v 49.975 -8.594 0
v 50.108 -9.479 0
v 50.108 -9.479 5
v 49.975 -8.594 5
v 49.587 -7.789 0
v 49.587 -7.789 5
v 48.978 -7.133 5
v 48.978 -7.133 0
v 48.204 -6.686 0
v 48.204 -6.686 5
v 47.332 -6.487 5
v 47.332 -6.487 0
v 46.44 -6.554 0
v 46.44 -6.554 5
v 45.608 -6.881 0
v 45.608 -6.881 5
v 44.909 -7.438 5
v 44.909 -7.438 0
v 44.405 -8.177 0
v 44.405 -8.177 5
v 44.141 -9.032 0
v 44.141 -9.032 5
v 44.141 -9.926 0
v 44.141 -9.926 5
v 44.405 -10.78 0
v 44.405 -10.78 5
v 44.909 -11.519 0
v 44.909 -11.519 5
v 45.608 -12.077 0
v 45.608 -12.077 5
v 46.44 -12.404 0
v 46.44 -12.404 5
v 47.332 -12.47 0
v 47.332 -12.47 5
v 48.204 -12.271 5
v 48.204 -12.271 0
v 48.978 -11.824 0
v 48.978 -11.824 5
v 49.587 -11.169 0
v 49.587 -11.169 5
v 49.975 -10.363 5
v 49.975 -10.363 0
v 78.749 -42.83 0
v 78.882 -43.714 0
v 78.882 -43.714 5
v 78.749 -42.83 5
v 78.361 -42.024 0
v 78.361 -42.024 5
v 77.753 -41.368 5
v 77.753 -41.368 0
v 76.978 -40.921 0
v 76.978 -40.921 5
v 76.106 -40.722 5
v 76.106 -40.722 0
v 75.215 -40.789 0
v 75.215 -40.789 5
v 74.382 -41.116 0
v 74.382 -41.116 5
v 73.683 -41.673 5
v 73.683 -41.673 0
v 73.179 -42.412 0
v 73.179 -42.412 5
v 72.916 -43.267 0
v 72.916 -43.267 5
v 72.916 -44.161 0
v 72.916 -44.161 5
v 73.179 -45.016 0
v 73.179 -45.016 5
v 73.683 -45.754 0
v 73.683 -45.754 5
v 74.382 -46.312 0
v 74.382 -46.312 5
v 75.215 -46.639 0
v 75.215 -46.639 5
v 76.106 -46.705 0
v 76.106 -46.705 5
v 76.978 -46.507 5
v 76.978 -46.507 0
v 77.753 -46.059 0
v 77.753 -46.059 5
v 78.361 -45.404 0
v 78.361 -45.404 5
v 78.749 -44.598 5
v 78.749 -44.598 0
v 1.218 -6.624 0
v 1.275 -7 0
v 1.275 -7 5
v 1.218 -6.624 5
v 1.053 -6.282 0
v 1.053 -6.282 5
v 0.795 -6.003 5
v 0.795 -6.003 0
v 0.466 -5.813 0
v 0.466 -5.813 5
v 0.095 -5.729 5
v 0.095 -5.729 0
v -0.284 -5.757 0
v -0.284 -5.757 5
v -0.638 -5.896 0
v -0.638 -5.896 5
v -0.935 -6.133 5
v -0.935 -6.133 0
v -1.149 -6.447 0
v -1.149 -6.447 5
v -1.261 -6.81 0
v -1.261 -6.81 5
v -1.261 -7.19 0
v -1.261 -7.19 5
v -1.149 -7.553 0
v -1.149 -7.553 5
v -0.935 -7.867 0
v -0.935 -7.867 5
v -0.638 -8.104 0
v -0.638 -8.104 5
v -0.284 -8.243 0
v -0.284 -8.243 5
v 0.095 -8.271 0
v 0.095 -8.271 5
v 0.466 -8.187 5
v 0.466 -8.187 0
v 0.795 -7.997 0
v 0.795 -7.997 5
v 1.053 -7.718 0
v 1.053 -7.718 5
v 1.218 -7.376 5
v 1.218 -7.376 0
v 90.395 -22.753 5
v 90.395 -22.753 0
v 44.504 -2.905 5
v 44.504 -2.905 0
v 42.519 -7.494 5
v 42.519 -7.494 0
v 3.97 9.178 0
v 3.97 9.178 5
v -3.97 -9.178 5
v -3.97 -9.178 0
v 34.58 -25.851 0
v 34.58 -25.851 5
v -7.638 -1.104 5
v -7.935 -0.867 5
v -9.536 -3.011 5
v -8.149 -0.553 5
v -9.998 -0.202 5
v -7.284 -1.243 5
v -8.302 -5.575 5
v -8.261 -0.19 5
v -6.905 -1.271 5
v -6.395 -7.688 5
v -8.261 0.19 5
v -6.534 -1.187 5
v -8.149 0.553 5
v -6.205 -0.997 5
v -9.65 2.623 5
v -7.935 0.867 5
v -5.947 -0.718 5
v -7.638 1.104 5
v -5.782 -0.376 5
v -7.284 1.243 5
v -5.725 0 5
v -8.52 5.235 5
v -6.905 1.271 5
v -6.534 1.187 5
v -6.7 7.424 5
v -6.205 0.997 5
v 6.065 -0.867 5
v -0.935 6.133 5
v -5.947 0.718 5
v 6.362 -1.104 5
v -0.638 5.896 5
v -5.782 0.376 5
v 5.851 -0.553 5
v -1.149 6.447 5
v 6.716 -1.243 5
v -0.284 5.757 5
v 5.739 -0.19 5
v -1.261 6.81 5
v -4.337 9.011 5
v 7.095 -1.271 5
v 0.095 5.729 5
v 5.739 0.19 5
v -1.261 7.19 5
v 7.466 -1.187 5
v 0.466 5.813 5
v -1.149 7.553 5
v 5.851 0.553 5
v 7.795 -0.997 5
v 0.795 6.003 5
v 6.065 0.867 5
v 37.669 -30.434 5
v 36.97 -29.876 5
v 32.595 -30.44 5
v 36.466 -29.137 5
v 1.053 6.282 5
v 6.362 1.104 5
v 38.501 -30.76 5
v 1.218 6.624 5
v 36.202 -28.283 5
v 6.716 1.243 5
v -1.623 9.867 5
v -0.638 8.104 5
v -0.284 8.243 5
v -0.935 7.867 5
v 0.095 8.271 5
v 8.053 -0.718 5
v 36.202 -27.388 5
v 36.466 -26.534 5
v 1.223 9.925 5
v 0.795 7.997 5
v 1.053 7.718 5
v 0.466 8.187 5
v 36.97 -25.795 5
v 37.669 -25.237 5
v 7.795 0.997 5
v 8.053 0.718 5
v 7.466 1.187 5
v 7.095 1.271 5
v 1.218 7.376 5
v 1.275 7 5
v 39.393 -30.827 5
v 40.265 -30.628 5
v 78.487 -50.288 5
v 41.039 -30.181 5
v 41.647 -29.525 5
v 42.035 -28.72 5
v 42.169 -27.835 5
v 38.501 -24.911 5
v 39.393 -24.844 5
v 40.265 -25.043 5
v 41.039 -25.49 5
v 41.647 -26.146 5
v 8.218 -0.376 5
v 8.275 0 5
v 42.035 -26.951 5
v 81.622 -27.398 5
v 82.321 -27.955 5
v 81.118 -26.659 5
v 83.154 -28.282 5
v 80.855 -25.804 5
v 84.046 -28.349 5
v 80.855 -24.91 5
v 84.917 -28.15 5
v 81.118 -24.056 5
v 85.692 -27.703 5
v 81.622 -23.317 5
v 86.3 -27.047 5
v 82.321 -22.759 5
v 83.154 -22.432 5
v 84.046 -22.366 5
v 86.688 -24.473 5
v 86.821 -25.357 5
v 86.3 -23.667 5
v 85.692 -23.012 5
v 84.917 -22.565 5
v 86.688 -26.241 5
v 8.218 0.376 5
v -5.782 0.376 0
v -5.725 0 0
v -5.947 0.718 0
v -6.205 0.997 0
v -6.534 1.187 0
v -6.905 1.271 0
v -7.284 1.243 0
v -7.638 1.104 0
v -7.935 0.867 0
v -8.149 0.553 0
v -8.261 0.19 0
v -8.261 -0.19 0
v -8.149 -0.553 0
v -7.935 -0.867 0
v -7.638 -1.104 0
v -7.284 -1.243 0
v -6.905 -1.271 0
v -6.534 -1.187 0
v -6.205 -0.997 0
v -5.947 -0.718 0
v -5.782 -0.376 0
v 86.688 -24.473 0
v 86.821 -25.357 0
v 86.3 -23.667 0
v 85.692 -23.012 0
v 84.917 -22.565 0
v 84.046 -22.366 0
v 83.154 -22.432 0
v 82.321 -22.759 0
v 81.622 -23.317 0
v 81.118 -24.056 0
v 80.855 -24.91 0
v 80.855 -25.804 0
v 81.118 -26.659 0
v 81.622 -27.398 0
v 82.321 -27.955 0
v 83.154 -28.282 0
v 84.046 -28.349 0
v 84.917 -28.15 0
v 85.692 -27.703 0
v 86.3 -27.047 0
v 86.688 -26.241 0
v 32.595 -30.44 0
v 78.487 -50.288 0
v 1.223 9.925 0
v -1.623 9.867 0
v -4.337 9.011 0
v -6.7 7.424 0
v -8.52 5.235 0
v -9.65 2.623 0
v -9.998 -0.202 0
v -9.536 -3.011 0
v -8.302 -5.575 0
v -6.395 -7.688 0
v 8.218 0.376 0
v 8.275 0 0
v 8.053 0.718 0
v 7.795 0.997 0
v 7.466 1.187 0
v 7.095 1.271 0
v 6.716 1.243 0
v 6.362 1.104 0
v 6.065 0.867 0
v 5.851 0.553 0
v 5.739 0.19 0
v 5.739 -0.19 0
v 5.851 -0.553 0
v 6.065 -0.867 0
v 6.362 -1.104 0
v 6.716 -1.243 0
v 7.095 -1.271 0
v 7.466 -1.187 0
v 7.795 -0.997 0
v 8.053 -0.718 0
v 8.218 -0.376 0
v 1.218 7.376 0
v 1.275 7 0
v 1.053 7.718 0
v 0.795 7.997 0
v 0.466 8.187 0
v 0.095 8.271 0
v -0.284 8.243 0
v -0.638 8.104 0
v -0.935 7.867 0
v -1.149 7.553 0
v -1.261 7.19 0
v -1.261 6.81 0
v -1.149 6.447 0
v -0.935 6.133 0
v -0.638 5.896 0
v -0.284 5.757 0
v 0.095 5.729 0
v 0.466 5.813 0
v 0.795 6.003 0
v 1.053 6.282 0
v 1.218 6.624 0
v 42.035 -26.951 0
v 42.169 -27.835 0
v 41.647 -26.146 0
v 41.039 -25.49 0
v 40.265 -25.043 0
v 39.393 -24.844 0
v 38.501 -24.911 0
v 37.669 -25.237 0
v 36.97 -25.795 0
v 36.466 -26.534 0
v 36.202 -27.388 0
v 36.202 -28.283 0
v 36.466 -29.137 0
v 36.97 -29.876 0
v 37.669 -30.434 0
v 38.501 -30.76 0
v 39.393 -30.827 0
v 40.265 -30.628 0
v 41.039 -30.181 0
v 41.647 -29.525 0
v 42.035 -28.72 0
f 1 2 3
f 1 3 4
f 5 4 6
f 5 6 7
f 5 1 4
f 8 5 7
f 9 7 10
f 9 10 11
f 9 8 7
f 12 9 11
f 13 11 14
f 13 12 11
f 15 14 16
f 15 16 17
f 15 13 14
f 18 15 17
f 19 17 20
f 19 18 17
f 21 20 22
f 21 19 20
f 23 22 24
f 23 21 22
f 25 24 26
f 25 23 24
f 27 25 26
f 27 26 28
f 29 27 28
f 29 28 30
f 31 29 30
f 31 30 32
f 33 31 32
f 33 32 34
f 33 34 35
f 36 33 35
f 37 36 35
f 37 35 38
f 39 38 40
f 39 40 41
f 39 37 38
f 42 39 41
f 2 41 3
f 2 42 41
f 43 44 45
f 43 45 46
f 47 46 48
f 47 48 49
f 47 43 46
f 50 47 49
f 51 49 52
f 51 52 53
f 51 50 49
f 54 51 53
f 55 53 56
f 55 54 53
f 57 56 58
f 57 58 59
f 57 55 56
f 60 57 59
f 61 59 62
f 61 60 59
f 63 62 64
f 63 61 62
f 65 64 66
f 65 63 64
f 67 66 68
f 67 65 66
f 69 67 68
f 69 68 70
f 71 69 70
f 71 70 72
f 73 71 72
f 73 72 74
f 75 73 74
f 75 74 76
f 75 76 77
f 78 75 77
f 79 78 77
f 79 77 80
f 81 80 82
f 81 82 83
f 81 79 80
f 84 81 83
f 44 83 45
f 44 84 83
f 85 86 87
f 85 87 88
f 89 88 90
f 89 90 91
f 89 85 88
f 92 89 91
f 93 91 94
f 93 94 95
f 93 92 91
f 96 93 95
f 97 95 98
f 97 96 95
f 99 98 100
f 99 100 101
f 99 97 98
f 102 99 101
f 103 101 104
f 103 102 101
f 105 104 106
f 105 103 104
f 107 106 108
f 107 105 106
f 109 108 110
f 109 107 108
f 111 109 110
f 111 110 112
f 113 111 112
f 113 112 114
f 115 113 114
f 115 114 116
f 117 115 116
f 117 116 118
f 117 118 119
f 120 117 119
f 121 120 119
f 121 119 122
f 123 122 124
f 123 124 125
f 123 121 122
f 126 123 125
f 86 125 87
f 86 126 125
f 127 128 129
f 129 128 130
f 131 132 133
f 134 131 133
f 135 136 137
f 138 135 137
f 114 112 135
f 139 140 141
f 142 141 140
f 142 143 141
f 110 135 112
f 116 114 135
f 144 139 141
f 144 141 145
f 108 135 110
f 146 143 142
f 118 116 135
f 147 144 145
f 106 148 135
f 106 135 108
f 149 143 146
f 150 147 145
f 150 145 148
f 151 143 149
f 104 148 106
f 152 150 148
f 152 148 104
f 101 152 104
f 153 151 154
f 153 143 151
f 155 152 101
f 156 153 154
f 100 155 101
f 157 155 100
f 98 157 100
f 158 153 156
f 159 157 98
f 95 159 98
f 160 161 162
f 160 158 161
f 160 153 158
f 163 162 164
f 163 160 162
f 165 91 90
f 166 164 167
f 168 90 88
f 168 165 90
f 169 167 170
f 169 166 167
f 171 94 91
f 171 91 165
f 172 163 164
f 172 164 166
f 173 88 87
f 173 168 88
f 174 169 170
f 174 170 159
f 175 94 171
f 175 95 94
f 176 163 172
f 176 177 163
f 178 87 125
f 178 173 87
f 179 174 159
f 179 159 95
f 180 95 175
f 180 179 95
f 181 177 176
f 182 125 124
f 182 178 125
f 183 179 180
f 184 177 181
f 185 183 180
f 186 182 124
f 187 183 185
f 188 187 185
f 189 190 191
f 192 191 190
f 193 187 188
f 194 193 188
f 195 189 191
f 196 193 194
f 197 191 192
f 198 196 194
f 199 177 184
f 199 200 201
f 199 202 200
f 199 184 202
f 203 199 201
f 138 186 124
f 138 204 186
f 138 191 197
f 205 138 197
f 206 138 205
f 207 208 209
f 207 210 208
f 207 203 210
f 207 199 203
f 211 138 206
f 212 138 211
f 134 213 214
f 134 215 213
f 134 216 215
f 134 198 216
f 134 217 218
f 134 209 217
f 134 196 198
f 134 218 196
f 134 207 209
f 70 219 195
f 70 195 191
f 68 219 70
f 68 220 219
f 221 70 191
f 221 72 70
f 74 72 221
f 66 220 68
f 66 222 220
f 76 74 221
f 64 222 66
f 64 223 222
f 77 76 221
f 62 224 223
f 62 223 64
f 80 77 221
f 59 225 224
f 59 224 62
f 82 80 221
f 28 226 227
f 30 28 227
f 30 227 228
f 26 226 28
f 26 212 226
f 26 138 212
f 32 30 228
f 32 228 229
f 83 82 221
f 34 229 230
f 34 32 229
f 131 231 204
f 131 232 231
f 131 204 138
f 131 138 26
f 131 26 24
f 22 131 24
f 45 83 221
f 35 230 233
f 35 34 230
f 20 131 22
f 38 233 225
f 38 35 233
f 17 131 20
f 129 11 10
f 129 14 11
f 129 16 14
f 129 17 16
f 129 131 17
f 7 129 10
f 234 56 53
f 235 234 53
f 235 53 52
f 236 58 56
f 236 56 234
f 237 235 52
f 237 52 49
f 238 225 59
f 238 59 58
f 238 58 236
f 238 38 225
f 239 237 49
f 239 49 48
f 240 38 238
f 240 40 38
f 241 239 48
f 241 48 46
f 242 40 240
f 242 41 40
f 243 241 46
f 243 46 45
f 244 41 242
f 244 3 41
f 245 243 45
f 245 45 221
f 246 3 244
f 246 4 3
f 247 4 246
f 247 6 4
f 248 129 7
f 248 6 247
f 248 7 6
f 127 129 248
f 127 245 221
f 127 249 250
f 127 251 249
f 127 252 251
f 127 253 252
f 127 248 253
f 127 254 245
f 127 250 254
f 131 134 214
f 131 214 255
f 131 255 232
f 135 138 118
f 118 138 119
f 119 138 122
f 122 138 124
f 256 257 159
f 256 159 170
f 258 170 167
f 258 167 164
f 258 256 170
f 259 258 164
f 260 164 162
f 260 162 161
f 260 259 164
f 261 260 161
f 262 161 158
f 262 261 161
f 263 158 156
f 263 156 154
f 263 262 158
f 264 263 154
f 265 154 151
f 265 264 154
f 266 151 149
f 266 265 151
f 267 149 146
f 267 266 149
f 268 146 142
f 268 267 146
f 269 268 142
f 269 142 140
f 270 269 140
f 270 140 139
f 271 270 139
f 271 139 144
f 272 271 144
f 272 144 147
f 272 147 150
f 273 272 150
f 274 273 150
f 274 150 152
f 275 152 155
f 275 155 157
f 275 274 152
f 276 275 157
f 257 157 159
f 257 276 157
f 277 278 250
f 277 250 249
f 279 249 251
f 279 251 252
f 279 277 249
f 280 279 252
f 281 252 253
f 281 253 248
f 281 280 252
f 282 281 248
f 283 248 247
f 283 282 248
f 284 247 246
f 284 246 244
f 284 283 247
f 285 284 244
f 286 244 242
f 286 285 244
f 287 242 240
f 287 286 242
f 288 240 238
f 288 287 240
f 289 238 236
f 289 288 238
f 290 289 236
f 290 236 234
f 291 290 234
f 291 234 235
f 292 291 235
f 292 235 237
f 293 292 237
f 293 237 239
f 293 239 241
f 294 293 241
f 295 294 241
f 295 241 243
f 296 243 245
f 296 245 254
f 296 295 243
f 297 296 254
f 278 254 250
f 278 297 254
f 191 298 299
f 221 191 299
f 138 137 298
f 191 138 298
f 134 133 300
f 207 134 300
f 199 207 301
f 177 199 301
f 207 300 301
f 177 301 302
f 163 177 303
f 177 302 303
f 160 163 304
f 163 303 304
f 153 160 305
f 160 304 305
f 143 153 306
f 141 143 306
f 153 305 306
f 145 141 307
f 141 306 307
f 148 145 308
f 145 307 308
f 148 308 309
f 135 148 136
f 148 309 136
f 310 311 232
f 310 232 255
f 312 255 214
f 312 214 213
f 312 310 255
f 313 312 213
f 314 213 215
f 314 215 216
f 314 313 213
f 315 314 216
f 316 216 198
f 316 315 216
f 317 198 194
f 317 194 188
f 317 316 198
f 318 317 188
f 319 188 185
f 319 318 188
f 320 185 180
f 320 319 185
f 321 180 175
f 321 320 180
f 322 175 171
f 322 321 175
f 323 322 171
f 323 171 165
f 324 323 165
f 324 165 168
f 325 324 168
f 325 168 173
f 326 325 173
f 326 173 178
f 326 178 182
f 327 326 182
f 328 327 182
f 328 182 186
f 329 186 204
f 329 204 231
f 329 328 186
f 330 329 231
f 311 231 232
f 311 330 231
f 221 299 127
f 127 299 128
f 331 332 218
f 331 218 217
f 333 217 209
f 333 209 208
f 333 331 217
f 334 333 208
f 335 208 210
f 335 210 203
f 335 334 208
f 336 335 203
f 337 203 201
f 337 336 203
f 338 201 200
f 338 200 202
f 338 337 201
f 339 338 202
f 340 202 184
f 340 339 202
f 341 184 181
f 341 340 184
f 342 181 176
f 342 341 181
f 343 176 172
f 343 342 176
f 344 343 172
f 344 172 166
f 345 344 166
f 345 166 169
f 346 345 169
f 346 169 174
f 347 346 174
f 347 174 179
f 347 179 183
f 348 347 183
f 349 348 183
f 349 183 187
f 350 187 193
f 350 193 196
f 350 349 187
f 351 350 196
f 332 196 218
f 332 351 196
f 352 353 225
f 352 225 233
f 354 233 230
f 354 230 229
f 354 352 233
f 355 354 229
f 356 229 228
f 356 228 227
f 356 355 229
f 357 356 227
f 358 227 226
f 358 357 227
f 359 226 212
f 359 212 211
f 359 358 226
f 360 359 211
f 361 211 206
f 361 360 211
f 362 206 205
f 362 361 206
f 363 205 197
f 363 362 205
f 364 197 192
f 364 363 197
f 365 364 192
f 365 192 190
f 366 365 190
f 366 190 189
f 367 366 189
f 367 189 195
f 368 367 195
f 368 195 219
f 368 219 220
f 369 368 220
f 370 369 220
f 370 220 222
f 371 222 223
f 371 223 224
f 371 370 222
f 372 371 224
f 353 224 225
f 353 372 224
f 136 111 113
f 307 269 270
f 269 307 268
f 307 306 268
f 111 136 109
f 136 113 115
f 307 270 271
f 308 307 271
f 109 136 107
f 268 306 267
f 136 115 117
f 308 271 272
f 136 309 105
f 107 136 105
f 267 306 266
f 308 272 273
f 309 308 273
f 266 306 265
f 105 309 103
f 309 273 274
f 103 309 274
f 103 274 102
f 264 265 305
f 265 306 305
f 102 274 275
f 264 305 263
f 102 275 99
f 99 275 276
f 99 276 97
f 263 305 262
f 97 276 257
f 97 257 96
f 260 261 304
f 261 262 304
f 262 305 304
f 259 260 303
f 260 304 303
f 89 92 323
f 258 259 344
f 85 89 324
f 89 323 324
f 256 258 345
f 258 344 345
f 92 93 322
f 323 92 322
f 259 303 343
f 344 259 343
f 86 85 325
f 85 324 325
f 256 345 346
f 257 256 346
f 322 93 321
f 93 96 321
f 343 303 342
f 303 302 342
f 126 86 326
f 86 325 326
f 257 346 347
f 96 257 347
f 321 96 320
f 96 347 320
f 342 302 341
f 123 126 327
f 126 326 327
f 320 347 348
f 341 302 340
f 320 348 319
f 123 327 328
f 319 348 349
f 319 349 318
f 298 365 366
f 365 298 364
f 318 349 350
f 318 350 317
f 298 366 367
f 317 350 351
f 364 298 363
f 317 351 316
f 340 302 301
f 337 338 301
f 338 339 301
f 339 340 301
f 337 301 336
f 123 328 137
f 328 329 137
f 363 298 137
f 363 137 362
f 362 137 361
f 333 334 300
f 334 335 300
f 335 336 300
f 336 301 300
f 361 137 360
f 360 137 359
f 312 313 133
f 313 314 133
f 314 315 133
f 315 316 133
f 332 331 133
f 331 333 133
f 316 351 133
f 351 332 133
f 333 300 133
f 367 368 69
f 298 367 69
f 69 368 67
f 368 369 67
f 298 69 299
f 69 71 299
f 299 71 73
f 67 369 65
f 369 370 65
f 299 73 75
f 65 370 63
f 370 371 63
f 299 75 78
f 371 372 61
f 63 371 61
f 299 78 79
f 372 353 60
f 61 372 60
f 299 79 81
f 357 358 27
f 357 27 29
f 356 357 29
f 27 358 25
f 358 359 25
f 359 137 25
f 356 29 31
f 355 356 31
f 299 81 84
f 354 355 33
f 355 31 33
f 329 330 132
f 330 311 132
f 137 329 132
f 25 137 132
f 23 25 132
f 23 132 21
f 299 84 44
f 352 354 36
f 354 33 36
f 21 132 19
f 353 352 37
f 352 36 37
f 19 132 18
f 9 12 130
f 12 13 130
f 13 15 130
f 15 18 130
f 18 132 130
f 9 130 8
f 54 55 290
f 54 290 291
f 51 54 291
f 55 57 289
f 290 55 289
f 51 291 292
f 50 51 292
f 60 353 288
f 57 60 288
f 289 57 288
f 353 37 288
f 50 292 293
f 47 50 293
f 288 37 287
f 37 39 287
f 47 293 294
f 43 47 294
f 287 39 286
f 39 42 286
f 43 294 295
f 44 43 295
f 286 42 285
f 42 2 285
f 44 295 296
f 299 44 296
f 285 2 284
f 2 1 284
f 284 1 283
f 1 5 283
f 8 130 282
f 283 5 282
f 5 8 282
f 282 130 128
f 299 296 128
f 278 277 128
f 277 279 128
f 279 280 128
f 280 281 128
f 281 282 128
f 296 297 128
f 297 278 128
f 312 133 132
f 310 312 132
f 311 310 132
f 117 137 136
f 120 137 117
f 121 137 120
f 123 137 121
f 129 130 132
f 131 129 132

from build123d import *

# Parameters (mm, degrees)
ESQUISSE2_R        = 1.275
ESQUISSE2_R_2      = 3
BOSS_EXTRU_1_DEPTH = 5


with BuildPart() as part:
    # Esquisse2 → Boss.-Extru.1 (new body)
    with BuildSketch(Plane.XY):
        with BuildLine():
            Line((42.518708235, -7.493960905), (3.969600002, 9.178359103))
            ThreePointArc((3.969600002, 9.178359103), (-9.178359103, 3.969600002), (-3.969600002, -9.178359103))
            Line((-3.969600002, -9.178359103), (34.579508231, -25.850679111))
            Line((34.579508231, -25.850679111), (32.59470823, -30.439858662))
            Line((32.59470823, -30.439858662), (78.486503746, -50.287858671))
            Line((78.486503746, -50.287858671), (90.395303751, -22.752781362))
            Line((90.395303751, -22.752781362), (44.503508236, -2.904781353))
            Line((44.503508236, -2.904781353), (42.518708235, -7.493960905))
        make_face()
        with Locations((7, 0)):
            Circle(ESQUISSE2_R, mode=Mode.SUBTRACT)
        with Locations((0, 7)):
            Circle(ESQUISSE2_R, mode=Mode.SUBTRACT)
        with Locations((-7, 0)):
            Circle(ESQUISSE2_R, mode=Mode.SUBTRACT)
        with Locations((0, -7)):
            Circle(ESQUISSE2_R, mode=Mode.SUBTRACT)
        with Locations((75.882124195, -43.713879119)):
            Circle(ESQUISSE2_R_2, mode=Mode.SUBTRACT)
        with Locations((83.821324199, -25.357160913)):
            Circle(ESQUISSE2_R_2, mode=Mode.SUBTRACT)
        with Locations((47.107887786, -9.478760905)):
            Circle(ESQUISSE2_R_2, mode=Mode.SUBTRACT)
        with Locations((39.168687783, -27.835479112)):
            Circle(ESQUISSE2_R_2, mode=Mode.SUBTRACT)
    extrude(amount=BOSS_EXTRU_1_DEPTH)


solid = part.part
